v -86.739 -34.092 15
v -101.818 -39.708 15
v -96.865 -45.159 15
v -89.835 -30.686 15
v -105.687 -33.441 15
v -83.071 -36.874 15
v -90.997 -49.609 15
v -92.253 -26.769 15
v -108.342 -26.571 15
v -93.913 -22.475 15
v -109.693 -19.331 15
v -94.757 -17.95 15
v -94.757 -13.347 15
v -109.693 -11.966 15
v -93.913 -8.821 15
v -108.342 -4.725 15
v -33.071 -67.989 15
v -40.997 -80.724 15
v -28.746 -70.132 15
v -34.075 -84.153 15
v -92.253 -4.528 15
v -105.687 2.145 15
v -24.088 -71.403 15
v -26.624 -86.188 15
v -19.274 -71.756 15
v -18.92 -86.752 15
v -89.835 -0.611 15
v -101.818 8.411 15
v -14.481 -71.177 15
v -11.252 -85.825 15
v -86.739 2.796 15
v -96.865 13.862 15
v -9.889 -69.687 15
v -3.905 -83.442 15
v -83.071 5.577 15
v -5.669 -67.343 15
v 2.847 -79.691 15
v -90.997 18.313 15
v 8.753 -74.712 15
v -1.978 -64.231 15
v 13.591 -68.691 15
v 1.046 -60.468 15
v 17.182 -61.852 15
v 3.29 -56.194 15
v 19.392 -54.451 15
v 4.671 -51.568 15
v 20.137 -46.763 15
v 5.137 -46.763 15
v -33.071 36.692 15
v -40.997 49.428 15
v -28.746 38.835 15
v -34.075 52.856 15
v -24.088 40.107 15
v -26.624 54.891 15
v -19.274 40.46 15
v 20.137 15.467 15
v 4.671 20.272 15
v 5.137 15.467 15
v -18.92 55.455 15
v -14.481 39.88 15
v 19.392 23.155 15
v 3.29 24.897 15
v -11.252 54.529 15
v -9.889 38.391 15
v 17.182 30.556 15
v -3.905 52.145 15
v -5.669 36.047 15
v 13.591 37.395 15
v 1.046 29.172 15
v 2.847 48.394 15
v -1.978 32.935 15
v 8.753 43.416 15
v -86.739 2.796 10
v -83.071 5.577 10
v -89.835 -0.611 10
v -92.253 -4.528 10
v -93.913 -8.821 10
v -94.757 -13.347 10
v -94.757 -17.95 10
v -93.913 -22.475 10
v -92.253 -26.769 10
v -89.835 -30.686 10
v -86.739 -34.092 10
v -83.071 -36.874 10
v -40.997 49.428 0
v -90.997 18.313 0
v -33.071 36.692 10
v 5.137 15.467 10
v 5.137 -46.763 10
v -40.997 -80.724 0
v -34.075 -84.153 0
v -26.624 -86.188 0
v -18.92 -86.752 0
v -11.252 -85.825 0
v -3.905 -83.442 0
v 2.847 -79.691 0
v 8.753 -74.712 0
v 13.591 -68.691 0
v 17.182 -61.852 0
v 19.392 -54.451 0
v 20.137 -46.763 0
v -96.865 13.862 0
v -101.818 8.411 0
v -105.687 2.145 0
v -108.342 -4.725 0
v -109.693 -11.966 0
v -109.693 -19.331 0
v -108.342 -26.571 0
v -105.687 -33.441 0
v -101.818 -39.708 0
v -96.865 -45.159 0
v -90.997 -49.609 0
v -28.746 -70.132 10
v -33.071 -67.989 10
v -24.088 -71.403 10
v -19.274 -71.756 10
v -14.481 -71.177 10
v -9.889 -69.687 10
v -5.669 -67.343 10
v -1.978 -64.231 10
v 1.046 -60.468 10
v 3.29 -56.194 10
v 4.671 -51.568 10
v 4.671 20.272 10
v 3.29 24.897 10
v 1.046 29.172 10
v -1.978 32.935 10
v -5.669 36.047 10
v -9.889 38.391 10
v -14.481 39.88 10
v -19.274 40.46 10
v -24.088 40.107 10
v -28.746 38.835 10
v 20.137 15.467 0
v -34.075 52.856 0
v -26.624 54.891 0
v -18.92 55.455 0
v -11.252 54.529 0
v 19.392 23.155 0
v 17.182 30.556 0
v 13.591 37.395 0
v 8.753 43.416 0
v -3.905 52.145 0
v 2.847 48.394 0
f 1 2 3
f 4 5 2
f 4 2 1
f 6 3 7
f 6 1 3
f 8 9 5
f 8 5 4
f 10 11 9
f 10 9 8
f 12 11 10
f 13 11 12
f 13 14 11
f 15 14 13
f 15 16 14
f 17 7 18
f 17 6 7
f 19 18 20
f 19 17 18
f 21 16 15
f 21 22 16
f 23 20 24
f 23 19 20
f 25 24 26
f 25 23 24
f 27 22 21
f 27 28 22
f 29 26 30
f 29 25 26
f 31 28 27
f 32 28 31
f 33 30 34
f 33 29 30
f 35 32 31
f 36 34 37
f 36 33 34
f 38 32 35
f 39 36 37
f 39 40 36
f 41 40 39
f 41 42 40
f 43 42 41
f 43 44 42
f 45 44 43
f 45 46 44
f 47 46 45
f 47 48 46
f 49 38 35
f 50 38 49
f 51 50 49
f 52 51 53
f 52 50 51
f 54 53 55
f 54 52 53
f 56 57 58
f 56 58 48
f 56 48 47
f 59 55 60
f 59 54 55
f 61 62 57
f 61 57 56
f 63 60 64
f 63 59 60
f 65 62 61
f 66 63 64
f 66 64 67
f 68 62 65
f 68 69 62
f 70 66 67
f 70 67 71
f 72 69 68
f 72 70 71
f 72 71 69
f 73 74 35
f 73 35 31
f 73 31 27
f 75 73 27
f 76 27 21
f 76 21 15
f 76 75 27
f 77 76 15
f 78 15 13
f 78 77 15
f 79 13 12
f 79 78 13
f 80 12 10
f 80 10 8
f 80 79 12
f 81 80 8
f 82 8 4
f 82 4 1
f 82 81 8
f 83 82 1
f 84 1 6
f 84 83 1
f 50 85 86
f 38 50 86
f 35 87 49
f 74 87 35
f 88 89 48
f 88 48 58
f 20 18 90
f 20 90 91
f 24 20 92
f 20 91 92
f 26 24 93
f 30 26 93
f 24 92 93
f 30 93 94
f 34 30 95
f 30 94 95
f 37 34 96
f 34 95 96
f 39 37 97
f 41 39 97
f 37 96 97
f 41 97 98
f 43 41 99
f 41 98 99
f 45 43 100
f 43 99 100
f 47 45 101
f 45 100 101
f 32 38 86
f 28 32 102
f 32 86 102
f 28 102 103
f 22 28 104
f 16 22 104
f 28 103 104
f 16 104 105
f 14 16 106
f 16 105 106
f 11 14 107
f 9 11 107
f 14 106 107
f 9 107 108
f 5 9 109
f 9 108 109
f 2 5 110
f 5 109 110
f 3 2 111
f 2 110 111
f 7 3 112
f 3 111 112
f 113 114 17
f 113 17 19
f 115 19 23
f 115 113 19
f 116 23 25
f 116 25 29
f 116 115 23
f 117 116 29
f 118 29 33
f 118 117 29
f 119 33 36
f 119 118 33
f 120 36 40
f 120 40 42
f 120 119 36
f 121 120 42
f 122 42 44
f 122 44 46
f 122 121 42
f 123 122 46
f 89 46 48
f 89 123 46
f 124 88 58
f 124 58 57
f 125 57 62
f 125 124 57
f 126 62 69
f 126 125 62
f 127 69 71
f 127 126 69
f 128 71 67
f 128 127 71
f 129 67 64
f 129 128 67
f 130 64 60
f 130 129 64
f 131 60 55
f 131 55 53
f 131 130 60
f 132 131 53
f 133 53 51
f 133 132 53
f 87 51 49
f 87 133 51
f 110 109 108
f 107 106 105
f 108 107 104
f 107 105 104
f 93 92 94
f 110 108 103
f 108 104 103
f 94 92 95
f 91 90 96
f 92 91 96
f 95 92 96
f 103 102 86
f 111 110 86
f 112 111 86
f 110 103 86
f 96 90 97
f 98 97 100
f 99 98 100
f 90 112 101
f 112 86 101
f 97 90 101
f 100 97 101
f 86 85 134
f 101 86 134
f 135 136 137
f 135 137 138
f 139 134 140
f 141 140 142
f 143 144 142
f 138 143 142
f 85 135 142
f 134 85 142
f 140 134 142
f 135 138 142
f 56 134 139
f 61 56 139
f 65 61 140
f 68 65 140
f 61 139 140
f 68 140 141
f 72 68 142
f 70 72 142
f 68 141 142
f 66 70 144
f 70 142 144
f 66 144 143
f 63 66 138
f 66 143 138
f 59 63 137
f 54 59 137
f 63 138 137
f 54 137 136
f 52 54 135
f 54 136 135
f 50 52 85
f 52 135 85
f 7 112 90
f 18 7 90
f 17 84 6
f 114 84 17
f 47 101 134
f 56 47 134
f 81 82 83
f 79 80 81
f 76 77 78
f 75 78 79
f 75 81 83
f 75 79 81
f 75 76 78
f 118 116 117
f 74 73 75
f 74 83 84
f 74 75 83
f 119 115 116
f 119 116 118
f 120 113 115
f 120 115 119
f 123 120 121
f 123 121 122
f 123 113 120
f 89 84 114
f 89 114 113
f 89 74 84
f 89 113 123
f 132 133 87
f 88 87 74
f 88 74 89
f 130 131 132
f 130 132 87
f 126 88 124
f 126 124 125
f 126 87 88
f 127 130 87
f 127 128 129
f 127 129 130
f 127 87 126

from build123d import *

# Parameters (mm, degrees)
Y_KSEKLIK_EKSTR_ZYON1_DEPTH = 15
BOSS_EXTRUDE1_DEPTH         = 10


with BuildPart() as part:
    # Çizim1 → Yükseklik-Ekstrüzyon1 (new body)
    with BuildSketch(Plane.XY):
        with BuildLine():
            Line((-90.996604912, -49.609404393), (-40.996604912, -80.724218798))
            ThreePointArc((-40.996604912, -80.724218798), (-0.437932375, -81.729892604), (20.137283846, -46.763082981))
            Line((20.137283846, -46.763082981), (20.137283846, 15.466545829))
            ThreePointArc((20.137283846, 15.466545829), (-0.437932375, 50.433355451), (-40.996604912, 49.427681645))
            Line((-40.996604912, 49.427681645), (-90.996604912, 18.31286724))
            ThreePointArc((-90.996604912, 18.31286724), (-109.862716154, -15.648268576), (-90.996604912, -49.609404393))
        make_face()
        with BuildLine():
            Line((-83.071396628, -36.873978462), (-33.071396628, -67.988792867))
            ThreePointArc((-33.071396628, -67.988792867), (-7.722226292, -68.617338995), (5.137283846, -46.763082981))
            Line((5.137283846, -46.763082981), (5.137283846, 15.466545829))
            ThreePointArc((5.137283846, 15.466545829), (-7.722226292, 37.320801843), (-33.071396628, 36.692255714))
            Line((-33.071396628, 36.692255714), (-83.071396628, 5.577441309))
            ThreePointArc((-83.071396628, 5.577441309), (-94.862716154, -15.648268576), (-83.071396628, -36.873978462))
        make_face(mode=Mode.SUBTRACT)
    extrude(amount=Y_KSEKLIK_EKSTR_ZYON1_DEPTH)

    # Çizim1<3> → Boss-Extrude1 (add)
    with BuildSketch(Plane.XY):
        with BuildLine():
            Line((-83.071396628, -36.873978462), (-33.071396628, -67.988792867))
            ThreePointArc((-33.071396628, -67.988792867), (-7.722226292, -68.617338995), (5.137283846, -46.763082981))
            Line((5.137283846, -46.763082981), (5.137283846, 15.466545829))
            ThreePointArc((5.137283846, 15.466545829), (-7.722226292, 37.320801843), (-33.071396628, 36.692255714))
            Line((-33.071396628, 36.692255714), (-83.071396628, 5.577441309))
            ThreePointArc((-83.071396628, 5.577441309), (-94.862716154, -15.648268576), (-83.071396628, -36.873978462))
        make_face()
    extrude(amount=BOSS_EXTRUDE1_DEPTH)


solid = part.part
